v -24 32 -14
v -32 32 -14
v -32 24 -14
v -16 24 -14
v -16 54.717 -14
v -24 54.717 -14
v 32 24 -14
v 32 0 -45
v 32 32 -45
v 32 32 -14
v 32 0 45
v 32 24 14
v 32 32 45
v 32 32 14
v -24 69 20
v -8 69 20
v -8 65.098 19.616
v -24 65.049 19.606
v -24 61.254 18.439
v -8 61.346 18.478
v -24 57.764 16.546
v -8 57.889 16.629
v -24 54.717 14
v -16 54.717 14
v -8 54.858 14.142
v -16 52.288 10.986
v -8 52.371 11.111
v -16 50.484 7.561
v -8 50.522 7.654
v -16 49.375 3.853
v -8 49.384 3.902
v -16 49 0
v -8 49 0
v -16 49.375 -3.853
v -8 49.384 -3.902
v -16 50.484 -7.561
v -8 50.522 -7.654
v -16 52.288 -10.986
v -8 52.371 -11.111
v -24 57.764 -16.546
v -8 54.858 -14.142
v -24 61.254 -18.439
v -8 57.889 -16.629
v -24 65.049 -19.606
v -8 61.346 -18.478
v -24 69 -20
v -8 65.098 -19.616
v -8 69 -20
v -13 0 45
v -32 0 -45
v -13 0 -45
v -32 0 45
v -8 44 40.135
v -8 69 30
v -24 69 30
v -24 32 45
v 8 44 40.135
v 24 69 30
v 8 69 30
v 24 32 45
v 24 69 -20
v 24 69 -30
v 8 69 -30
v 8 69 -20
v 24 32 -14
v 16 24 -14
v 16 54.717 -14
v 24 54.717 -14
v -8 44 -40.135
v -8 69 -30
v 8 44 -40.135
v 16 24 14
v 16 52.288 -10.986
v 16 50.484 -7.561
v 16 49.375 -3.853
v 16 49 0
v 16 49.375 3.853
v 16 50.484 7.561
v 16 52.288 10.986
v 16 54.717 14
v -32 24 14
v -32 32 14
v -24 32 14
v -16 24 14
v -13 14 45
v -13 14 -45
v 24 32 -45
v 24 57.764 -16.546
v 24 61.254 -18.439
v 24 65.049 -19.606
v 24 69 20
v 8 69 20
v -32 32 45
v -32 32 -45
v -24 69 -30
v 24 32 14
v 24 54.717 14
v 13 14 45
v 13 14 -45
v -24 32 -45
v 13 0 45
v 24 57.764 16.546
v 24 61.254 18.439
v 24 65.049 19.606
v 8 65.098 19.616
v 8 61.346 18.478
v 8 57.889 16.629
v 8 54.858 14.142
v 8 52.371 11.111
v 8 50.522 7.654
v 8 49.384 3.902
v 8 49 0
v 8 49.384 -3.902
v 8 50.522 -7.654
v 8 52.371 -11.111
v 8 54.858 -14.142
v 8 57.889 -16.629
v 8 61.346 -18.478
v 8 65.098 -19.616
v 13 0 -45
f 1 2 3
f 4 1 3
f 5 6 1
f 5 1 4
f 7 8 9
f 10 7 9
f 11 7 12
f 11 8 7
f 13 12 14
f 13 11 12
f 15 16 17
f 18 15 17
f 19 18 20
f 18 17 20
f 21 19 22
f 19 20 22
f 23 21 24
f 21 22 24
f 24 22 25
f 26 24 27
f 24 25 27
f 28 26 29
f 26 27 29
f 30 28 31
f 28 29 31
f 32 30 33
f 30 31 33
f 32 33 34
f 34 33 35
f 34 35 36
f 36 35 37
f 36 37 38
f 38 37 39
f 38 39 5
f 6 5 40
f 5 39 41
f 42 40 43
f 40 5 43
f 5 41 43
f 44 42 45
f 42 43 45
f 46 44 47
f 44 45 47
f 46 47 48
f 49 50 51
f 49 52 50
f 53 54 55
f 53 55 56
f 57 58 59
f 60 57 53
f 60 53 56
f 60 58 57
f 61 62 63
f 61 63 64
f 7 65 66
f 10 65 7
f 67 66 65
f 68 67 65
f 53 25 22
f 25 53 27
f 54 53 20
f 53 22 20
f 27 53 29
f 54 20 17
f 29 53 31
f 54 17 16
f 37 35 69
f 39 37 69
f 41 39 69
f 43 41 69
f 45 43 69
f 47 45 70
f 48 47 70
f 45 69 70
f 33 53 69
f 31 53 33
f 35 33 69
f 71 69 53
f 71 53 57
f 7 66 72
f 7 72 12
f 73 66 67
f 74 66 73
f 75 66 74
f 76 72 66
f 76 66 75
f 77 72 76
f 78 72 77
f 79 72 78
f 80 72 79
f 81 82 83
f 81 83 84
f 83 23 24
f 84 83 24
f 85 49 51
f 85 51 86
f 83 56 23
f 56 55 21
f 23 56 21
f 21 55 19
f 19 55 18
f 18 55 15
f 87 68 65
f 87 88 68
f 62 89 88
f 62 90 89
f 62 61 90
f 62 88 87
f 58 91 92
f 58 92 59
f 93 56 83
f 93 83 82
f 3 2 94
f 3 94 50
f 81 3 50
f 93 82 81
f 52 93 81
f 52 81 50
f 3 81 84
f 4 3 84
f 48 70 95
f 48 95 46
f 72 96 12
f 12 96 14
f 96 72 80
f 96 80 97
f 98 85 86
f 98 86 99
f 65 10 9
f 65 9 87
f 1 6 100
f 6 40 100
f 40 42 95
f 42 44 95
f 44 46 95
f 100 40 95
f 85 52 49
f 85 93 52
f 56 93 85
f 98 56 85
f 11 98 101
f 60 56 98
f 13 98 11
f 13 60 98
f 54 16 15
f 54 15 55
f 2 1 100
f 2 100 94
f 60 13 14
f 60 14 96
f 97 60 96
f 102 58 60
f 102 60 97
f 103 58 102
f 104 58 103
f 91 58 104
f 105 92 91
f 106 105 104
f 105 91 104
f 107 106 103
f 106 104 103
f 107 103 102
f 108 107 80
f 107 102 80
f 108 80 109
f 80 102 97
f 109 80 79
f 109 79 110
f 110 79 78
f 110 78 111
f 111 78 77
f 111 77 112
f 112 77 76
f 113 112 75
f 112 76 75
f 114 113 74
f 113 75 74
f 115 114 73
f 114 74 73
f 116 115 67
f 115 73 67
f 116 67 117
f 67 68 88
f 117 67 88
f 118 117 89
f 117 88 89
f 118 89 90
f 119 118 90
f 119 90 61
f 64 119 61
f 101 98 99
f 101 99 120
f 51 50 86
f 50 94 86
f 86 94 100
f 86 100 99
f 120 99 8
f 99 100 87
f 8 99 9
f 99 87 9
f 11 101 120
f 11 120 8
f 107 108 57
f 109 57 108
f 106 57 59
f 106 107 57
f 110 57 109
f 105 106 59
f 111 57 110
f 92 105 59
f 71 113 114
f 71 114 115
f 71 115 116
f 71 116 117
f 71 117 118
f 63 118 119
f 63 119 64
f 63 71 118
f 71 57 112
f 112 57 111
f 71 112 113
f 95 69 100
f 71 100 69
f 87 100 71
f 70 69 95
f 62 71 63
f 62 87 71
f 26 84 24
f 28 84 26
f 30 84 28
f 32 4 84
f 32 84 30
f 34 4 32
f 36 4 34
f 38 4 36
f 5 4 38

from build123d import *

# Parameters (mm, degrees)
BOSS_EXTRUDE1_DEPTH     = 45
BOSS_EXTRUDE2_DEPTH     = 24
CUT_EXTRUDE1_DEPTH      = 89.374204381
CUT_EXTRUDE1_DEPTH_BACK = 89.374204381
SKETCH3_W               = 16
SKETCH3_H               = 25
SKETCH4_R               = 20
CUT_EXTRUDE2_DEPTH      = 100.60923652
SKETCH5_W               = 16
SKETCH5_H               = 45
CUT_EXTRUDE3_DEPTH      = 14


with BuildPart() as part:
    # Sketch1 → Boss-Extrude1 (new, symmetric)
    with BuildSketch(Plane.XY):
        Polygon((-32, 0), (-13, 0), (-13, 14), (13, 14), (13, 0), (32, 0), (32, 32), (-32, 32), align=None)
    extrude(amount=BOSS_EXTRUDE1_DEPTH, both=True)

    # Sketch2 → Boss-Extrude2 (add, symmetric)
    with BuildSketch(Plane(origin=(0, 0, 0), x_dir=(0, 0, -1), z_dir=(1, 0, 0))):
        Polygon((-45, 32), (45, 32), (30, 69), (-30, 69), align=None)
    extrude(amount=BOSS_EXTRUDE2_DEPTH, both=True)

    # Sketch3 → Cut-Extrude1 (cut, two sides: drawn at the far end of the back side and taken through both)
    with BuildSketch(Plane.XY.offset(-CUT_EXTRUDE1_DEPTH_BACK)):
        with Locations((0, 56.5)):
            Rectangle(SKETCH3_W, SKETCH3_H)
    extrude(amount=CUT_EXTRUDE1_DEPTH + CUT_EXTRUDE1_DEPTH_BACK, mode=Mode.SUBTRACT)

    # Sketch4 → Cut-Extrude2 (cut, through all)
    with BuildSketch(Plane(origin=(24, 0, 0), x_dir=(0, 0, -1), z_dir=(1, 0, 0))):
        with Locations((0, 69)):
            Circle(SKETCH4_R)
    extrude(amount=-CUT_EXTRUDE2_DEPTH, mode=Mode.SUBTRACT)

    # Sketch5 → Cut-Extrude3 (cut, symmetric)
    with BuildSketch(Plane.XY):
        with Locations((-24, 46.5)):
            Rectangle(SKETCH5_W, SKETCH5_H)
        with Locations((24, 46.5)):
            Rectangle(SKETCH5_W, SKETCH5_H)
    extrude(amount=CUT_EXTRUDE3_DEPTH, both=True, mode=Mode.SUBTRACT)


solid = part.part
